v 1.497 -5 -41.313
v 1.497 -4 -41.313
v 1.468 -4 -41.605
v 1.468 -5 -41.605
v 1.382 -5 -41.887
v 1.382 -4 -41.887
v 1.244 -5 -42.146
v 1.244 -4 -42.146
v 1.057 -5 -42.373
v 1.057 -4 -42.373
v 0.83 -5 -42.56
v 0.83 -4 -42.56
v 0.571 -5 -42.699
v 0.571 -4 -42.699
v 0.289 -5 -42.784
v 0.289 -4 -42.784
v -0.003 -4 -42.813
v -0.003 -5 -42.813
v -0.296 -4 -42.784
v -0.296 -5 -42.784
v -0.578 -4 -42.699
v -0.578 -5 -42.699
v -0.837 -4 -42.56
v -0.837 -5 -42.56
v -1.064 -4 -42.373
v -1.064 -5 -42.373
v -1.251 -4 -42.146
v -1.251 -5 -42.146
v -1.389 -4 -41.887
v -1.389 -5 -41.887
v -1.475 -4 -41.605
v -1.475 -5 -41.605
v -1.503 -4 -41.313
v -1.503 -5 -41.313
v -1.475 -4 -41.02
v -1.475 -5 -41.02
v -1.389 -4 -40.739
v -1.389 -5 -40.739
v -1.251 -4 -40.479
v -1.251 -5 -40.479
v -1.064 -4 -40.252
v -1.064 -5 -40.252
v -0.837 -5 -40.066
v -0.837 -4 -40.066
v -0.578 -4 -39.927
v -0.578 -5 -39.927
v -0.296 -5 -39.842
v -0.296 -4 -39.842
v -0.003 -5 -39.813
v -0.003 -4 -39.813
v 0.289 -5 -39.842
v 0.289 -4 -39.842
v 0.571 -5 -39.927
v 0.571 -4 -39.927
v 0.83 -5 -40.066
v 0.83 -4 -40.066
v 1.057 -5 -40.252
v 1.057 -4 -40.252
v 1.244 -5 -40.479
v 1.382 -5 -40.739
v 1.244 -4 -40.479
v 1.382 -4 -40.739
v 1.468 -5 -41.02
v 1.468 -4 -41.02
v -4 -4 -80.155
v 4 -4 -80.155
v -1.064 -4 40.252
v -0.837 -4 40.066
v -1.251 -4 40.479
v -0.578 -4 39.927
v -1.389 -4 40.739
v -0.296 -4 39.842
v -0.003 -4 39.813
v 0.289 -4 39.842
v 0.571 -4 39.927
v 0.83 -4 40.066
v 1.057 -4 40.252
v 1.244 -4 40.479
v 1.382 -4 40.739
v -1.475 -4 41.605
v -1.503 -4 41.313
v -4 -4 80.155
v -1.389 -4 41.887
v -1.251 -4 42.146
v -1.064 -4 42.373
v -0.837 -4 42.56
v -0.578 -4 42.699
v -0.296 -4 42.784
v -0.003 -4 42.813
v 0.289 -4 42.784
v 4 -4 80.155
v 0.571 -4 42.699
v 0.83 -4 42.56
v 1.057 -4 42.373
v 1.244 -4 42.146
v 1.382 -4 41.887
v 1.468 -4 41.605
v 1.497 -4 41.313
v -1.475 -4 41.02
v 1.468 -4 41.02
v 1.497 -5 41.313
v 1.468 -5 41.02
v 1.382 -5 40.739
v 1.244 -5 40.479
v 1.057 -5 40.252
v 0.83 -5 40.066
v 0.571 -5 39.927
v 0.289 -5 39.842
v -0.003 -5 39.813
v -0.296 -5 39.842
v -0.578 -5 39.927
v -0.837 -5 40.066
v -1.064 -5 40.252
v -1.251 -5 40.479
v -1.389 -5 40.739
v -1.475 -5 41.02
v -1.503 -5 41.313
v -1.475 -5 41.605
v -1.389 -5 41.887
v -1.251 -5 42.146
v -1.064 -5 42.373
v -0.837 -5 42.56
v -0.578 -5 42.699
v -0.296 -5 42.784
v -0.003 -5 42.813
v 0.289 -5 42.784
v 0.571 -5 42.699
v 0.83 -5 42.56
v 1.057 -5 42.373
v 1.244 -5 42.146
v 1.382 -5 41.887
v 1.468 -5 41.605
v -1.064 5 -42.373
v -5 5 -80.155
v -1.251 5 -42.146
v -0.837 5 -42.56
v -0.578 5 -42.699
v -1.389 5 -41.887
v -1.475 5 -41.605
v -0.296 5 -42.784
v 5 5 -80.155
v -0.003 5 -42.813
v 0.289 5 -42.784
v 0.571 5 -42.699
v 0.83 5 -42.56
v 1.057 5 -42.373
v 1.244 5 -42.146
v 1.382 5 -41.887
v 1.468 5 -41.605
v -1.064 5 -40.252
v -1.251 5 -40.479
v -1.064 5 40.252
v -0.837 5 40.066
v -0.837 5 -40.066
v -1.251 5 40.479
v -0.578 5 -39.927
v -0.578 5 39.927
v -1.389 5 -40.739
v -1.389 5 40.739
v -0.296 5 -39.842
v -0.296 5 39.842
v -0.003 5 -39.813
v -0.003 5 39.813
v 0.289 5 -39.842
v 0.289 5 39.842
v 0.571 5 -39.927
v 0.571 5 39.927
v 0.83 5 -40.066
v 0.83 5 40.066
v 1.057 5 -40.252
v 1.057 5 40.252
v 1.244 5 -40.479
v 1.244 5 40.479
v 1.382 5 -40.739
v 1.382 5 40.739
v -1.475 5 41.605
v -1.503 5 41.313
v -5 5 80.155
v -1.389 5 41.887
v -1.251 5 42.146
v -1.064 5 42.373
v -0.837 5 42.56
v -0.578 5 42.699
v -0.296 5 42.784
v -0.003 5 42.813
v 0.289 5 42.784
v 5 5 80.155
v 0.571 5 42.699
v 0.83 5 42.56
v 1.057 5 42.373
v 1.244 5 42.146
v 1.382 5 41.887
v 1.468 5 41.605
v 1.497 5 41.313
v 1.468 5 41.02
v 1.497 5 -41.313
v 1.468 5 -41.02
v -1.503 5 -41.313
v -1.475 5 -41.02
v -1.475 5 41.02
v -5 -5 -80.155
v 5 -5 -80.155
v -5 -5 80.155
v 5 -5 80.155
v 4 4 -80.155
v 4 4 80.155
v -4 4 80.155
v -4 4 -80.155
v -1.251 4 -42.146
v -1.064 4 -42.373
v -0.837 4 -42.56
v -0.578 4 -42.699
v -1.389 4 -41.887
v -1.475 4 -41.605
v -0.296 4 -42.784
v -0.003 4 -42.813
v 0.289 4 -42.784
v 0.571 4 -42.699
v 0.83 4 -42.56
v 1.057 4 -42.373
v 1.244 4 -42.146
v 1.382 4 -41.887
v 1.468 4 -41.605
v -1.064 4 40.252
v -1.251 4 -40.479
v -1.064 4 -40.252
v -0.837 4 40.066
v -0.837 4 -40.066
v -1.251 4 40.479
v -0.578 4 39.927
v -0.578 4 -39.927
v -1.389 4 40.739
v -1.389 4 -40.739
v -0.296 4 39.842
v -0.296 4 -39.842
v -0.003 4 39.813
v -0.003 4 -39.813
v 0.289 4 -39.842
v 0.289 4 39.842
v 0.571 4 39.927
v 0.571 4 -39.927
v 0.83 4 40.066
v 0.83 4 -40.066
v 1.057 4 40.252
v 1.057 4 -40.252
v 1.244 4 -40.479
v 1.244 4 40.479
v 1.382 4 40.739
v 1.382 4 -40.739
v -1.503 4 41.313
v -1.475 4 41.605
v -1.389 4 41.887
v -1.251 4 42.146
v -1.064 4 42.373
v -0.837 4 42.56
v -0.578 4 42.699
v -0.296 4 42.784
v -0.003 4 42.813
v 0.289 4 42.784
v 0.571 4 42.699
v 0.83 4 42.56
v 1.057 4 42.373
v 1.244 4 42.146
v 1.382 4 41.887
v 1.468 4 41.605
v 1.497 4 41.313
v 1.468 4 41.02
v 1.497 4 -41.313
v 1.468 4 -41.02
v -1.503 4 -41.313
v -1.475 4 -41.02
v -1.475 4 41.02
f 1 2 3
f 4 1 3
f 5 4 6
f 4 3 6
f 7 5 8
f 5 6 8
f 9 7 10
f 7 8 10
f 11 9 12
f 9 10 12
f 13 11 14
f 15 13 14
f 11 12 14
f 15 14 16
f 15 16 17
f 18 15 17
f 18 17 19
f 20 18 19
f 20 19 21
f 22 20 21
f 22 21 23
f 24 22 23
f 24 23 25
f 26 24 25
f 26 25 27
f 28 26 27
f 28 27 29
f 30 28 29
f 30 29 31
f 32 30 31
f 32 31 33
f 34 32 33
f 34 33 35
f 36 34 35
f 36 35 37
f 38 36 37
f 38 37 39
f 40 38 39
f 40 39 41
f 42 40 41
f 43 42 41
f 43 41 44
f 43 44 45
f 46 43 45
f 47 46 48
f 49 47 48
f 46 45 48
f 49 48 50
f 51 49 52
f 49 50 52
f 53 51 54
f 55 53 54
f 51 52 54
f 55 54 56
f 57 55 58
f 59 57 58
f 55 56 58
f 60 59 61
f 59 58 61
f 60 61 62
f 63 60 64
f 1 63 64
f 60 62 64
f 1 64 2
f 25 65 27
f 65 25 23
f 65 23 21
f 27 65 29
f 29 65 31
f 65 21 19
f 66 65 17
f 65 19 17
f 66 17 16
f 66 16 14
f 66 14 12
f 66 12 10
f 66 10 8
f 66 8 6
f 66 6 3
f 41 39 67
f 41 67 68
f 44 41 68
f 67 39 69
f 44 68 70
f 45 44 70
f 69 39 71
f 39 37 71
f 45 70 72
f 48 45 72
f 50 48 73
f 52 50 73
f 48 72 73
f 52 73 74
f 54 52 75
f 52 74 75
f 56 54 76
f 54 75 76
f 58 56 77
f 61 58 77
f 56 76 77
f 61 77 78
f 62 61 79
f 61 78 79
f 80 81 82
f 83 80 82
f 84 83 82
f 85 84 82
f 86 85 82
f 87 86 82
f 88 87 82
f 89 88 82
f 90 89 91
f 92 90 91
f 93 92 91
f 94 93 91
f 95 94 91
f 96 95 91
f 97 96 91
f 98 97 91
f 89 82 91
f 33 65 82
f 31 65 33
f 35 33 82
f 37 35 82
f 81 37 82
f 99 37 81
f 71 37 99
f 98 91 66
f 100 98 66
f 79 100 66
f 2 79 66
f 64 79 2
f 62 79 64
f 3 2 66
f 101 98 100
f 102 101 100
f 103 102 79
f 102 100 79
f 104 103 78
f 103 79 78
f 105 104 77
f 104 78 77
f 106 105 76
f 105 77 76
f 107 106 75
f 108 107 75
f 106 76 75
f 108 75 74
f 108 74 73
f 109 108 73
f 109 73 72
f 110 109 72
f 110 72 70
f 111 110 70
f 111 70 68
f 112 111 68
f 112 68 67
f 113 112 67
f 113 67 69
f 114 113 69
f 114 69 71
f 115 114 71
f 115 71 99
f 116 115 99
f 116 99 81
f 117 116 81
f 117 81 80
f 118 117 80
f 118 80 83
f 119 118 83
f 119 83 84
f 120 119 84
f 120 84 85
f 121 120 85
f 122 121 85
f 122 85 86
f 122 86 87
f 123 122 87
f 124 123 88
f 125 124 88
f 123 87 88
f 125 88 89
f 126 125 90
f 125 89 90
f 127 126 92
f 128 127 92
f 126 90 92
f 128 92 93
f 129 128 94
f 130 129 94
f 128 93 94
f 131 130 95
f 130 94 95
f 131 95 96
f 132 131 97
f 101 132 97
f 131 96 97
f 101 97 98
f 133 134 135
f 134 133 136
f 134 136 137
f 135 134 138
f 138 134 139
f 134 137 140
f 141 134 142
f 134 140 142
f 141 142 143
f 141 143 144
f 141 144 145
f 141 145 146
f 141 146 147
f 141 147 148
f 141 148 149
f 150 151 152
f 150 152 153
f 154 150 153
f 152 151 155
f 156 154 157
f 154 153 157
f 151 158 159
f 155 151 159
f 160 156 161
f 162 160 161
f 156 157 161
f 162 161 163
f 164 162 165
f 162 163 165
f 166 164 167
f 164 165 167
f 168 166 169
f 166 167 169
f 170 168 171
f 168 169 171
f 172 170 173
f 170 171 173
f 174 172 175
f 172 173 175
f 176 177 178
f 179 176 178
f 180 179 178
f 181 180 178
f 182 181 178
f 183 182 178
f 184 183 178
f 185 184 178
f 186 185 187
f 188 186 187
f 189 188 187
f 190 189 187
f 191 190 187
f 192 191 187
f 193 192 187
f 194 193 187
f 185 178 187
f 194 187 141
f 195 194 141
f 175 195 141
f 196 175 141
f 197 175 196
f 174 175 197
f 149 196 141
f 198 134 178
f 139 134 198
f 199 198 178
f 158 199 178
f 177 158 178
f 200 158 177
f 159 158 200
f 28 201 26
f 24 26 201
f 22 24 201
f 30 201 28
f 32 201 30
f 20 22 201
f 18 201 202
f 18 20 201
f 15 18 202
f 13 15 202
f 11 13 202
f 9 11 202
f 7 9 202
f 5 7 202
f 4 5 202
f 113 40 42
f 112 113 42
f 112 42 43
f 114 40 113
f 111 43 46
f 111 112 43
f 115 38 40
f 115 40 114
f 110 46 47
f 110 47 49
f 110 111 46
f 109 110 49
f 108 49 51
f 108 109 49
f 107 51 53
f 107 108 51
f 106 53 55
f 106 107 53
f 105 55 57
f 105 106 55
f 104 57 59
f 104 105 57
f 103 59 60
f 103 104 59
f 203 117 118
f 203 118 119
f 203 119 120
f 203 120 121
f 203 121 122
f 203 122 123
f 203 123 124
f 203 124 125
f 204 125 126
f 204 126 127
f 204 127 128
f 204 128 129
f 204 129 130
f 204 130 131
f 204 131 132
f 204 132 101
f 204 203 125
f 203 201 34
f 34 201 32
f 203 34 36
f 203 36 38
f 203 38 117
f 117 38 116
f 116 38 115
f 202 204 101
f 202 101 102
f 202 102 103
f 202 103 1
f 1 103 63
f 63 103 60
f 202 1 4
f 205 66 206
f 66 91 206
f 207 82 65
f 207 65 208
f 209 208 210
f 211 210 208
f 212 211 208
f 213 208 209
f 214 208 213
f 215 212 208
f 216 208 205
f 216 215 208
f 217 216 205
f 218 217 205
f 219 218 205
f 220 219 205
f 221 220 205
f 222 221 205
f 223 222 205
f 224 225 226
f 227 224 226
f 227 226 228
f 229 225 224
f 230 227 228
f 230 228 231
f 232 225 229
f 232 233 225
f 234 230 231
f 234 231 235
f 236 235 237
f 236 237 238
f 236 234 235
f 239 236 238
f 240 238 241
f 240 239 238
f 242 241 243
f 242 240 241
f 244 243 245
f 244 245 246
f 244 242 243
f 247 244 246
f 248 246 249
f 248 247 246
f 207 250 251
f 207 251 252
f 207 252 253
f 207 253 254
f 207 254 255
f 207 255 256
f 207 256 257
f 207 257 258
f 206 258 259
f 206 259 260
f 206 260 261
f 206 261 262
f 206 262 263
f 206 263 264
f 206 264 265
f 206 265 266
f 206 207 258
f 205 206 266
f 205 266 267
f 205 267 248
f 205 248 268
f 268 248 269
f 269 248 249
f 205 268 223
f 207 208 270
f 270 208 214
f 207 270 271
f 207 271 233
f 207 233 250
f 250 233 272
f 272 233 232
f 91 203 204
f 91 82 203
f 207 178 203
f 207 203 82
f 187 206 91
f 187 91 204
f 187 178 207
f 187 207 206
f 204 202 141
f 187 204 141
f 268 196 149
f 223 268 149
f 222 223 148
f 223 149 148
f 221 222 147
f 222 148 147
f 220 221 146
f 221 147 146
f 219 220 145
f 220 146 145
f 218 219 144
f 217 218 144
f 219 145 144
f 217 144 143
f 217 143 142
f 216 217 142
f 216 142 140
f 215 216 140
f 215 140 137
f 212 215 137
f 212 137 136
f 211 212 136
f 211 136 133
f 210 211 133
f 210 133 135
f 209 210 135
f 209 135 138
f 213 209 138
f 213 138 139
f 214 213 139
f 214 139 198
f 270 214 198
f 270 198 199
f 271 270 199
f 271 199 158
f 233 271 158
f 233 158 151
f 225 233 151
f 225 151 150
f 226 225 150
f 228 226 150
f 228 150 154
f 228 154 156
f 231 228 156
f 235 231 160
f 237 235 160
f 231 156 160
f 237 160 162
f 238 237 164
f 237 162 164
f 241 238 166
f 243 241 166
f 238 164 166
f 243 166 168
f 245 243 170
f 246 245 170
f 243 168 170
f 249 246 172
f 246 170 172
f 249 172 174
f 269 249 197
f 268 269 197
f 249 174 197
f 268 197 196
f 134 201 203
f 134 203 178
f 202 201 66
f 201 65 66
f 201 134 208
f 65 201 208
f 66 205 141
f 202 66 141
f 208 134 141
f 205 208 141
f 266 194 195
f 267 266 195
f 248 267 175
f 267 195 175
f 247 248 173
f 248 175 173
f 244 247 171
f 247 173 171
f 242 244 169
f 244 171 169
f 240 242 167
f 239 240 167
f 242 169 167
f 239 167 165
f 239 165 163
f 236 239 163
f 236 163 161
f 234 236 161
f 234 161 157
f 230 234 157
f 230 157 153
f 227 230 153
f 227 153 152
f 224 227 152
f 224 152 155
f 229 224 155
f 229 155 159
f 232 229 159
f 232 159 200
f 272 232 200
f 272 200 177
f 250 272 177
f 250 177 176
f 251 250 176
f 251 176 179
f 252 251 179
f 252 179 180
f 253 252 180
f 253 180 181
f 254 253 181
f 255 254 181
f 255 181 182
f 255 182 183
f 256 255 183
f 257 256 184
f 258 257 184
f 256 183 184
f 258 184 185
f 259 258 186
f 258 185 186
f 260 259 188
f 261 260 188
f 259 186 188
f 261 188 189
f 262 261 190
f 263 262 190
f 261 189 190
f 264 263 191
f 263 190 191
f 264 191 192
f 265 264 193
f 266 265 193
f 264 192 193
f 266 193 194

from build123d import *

# Parameters (mm, degrees)
SKETCH_1_W      = 10
SKETCH_1_H      = 10
SKETCH_1_W_2    = 8
SKETCH_1_H_2    = 8
EXTRUDE_1_DEPTH = 80.155
HOLE_WIZARD_1_D = 3


with BuildPart() as part:
    # 草图1 → 凸台-拉伸1 (new, symmetric)
    with BuildSketch(Plane.XY):
        Rectangle(SKETCH_1_W, SKETCH_1_H)
        Rectangle(SKETCH_1_W_2, SKETCH_1_H_2, mode=Mode.SUBTRACT)
    extrude(amount=EXTRUDE_1_DEPTH, both=True)

    # 孔1 (through all)
    with Locations(Plane(origin=(0, -5, 0), x_dir=(-1, 0, 0), z_dir=(0, -1, 0))):
        with Locations((0.003475522, -41.312740983), (0.003475522, 41.312740983)):
            Hole(HOLE_WIZARD_1_D / 2)


solid = part.part
